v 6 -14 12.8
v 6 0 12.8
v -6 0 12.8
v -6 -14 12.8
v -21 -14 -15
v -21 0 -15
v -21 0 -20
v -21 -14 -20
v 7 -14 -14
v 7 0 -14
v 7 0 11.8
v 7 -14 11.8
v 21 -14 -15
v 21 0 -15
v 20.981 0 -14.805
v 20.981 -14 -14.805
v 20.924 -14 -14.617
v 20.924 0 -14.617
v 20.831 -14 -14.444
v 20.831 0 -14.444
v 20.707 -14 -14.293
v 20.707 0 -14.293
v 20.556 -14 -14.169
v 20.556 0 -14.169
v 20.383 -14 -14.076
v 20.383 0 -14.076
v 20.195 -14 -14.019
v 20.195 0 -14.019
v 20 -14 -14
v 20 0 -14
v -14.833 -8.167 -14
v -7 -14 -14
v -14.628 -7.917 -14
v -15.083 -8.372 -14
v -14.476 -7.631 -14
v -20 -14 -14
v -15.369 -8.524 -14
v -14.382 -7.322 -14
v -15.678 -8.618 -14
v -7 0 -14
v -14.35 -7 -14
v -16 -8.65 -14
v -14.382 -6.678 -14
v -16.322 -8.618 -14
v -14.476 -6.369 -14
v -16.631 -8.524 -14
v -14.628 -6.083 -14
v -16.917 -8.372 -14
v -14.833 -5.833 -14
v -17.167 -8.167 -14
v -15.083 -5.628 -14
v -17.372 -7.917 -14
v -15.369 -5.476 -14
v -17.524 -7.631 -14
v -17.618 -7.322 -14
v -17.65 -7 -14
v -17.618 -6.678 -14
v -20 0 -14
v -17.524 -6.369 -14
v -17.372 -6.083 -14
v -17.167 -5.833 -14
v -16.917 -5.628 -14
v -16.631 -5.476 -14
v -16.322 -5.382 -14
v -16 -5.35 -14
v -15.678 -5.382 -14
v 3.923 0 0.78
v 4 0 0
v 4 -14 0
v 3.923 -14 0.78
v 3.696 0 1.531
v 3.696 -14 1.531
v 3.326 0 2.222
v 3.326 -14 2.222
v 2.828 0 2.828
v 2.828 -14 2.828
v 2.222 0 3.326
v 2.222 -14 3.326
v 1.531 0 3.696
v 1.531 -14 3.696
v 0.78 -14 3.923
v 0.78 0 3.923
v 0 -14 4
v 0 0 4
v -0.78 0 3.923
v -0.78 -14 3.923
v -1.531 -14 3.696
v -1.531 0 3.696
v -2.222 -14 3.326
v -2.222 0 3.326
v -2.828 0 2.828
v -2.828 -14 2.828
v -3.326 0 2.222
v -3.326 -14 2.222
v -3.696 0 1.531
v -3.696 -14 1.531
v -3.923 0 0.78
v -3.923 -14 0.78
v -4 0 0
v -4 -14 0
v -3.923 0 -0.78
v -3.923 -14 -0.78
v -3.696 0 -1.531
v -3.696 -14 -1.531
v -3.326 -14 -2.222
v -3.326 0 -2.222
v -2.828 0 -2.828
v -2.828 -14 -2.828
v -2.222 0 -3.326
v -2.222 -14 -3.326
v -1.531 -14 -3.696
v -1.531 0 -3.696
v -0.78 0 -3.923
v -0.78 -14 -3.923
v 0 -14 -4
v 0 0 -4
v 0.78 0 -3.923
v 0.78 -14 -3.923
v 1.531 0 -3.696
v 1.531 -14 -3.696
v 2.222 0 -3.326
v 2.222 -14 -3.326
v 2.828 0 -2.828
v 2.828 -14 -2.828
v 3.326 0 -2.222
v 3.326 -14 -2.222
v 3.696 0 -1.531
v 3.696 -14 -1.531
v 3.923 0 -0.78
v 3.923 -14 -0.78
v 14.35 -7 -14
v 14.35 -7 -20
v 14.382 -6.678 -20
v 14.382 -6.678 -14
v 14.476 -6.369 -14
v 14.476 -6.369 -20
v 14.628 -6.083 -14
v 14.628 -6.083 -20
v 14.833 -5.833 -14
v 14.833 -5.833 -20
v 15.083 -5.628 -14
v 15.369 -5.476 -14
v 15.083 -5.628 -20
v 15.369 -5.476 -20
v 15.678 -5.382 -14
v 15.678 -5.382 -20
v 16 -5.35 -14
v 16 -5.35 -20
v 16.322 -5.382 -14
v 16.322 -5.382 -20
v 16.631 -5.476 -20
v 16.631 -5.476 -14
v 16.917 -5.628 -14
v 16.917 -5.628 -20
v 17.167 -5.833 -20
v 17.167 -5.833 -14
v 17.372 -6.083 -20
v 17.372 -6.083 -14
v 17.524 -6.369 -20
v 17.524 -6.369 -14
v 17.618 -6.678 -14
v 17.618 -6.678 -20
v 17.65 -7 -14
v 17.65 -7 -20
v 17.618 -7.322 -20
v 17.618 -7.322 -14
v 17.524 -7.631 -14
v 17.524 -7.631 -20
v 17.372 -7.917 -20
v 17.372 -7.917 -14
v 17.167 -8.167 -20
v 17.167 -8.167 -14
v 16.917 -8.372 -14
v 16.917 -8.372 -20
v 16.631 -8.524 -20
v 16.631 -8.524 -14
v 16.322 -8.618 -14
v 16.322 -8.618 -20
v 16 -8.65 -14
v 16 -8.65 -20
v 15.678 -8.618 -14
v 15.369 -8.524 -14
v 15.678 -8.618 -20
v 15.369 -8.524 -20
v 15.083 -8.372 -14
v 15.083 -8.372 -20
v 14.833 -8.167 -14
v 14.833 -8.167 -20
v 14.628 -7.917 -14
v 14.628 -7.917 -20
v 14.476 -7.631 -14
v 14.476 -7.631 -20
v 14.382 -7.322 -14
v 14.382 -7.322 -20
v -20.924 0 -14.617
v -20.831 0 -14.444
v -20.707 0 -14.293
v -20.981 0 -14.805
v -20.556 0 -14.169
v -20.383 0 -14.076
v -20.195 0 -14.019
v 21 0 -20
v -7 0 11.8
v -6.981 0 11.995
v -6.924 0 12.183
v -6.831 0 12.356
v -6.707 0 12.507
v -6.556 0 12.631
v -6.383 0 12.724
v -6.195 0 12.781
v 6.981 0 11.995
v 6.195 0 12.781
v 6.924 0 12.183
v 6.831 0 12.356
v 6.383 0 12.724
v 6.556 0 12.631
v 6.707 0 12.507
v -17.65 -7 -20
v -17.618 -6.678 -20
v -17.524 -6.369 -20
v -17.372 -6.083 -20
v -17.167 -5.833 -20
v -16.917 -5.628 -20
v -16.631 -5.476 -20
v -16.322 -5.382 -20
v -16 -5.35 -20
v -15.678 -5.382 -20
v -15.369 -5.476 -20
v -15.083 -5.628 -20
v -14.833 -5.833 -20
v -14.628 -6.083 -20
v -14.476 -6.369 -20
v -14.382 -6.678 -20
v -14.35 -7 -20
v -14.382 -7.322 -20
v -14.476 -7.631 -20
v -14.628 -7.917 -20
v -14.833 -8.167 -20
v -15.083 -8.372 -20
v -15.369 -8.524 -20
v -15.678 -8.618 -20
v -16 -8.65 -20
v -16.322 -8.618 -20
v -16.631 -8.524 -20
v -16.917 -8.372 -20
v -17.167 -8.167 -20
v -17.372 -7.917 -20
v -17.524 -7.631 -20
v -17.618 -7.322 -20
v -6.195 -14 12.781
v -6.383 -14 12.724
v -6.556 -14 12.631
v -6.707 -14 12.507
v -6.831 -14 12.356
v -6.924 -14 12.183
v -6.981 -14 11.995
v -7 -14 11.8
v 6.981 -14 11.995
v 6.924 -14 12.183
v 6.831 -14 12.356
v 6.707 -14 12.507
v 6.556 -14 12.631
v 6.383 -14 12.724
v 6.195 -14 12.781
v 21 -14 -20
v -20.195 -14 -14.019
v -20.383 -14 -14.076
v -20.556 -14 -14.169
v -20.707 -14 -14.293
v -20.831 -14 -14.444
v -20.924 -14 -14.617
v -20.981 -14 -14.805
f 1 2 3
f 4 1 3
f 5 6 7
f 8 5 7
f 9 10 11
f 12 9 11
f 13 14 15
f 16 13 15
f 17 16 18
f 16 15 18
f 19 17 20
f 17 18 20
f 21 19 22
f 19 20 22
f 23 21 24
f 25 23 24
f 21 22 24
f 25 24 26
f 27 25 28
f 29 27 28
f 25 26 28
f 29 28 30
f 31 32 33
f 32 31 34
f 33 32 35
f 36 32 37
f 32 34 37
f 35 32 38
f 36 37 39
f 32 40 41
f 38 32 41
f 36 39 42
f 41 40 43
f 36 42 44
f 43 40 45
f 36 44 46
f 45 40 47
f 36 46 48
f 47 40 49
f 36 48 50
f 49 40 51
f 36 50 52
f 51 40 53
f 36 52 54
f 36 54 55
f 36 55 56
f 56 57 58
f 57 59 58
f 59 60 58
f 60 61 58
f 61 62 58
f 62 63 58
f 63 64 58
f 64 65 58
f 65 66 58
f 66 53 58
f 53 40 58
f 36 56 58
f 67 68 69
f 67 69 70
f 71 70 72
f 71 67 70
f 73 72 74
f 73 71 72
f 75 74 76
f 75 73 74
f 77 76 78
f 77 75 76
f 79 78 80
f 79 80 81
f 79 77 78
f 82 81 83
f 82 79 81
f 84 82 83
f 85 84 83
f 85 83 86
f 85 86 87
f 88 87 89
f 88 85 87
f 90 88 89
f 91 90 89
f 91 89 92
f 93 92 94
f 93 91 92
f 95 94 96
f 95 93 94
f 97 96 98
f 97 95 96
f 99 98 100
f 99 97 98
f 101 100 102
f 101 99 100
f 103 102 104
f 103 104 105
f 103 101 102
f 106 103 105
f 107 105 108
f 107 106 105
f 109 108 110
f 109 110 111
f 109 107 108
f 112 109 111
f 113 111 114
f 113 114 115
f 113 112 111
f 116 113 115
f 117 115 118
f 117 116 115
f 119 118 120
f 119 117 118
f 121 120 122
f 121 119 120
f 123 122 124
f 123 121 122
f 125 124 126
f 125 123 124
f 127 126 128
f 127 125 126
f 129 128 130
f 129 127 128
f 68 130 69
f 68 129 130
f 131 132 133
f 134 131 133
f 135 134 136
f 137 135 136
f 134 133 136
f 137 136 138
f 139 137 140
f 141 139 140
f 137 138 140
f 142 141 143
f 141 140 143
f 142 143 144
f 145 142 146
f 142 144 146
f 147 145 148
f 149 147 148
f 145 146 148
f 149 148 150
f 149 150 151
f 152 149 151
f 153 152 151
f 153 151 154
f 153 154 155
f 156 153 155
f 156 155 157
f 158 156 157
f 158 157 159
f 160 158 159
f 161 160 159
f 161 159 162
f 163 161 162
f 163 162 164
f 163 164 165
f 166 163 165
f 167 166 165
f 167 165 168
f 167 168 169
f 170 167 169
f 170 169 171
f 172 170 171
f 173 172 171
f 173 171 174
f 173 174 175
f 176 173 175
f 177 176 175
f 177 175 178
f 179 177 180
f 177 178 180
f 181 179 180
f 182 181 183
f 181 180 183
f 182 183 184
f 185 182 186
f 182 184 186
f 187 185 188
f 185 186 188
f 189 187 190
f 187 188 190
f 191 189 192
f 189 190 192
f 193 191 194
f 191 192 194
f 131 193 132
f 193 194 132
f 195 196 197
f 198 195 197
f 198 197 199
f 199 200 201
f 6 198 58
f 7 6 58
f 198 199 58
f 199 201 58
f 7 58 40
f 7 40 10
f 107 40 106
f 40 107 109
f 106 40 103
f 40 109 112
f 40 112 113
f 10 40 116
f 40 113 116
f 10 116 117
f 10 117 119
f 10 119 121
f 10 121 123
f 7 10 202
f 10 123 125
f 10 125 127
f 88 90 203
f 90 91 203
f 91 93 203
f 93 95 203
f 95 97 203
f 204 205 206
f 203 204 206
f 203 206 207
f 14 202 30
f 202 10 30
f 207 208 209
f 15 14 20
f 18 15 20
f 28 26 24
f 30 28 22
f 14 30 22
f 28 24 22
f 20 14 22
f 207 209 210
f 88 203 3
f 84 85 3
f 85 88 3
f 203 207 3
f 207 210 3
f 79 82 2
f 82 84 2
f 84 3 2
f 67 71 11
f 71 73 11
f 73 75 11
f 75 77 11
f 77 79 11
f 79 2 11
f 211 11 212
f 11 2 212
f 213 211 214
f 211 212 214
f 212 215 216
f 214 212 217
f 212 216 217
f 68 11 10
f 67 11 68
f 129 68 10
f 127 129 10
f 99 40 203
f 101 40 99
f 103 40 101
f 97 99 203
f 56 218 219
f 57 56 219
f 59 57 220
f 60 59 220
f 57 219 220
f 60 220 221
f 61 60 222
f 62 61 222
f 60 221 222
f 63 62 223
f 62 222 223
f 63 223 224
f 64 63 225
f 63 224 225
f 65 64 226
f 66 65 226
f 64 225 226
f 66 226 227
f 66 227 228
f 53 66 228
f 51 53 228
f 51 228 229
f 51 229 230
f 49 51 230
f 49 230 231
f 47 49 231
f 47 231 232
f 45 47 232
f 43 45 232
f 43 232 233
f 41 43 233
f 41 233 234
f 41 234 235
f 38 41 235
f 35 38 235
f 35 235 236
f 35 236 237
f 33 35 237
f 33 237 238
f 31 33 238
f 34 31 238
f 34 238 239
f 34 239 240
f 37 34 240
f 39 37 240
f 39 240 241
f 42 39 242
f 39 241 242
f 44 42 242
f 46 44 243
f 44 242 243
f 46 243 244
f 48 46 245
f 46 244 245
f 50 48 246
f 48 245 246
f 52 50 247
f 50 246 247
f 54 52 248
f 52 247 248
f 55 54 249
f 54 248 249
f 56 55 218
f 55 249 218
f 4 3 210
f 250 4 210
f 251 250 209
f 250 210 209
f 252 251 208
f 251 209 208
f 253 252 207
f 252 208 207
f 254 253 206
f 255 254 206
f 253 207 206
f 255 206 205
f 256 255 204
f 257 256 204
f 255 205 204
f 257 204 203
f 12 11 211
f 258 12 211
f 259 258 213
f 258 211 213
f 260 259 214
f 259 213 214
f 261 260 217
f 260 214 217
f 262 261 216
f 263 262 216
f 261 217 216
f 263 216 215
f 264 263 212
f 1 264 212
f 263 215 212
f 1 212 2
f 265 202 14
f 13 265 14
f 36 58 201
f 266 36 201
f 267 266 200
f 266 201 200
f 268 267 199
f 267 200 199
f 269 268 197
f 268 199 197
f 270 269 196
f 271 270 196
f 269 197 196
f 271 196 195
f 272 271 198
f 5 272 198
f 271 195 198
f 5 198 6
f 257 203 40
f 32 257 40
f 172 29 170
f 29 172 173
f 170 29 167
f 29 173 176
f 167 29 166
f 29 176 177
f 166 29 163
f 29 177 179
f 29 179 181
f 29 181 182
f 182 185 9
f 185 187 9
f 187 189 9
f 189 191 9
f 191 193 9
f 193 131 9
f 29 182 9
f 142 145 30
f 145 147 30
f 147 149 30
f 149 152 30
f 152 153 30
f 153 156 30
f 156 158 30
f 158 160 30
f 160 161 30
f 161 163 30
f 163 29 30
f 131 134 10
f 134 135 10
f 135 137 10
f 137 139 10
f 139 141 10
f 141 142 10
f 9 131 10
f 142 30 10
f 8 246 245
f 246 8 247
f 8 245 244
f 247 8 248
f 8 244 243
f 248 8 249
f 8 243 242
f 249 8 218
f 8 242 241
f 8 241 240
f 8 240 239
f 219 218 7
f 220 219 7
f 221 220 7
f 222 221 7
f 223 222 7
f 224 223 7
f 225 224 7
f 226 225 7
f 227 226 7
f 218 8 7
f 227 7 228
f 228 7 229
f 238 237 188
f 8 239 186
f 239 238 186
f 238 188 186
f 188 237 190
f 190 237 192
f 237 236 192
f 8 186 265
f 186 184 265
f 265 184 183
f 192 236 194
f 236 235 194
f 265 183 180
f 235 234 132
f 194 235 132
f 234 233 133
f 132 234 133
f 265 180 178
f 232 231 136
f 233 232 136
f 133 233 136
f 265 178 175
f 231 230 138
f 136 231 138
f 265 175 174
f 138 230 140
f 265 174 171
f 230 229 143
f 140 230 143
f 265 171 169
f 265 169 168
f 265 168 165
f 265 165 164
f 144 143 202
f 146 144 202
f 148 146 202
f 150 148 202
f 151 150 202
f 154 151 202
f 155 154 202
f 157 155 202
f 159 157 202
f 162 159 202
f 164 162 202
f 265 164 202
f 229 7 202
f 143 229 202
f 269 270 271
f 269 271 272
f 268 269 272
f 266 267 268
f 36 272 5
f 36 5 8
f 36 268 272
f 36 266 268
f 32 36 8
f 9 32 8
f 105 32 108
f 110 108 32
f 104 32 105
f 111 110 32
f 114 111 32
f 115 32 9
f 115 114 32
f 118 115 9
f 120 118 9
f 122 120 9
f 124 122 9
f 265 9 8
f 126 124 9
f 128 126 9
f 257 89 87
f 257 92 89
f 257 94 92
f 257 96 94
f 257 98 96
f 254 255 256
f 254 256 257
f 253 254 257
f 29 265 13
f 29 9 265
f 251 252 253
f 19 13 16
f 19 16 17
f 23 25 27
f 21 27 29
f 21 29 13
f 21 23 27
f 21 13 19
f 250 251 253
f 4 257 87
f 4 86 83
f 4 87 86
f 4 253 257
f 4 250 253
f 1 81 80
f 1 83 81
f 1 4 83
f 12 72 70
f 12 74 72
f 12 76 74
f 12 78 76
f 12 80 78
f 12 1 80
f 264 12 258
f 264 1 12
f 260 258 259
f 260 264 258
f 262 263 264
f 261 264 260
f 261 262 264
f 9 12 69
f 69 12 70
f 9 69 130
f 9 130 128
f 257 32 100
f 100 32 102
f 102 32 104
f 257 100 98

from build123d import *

# Parameters (mm, degrees)
F0_R     = 4
F1_DEPTH = 14
F3_D     = 3.3


with BuildPart() as f1:
    # F0 (on Front) → F1 (new body)
    with BuildSketch(Plane.XZ):
        with BuildLine():
            Line((20, -14), (7, -14))
            Line((7, -14), (7, 11.8))
            ThreePointArc((7, 11.8), (6.707107, 12.507107), (6, 12.8))
            Line((6, 12.8), (-6, 12.8))
            ThreePointArc((-6, 12.8), (-6.707107, 12.507107), (-7, 11.8))
            Line((-7, 11.8), (-7, -14))
            Line((-7, -14), (-20, -14))
            ThreePointArc((-20, -14), (-20.707107, -14.292893), (-21, -15))
            Line((-21, -15), (-21, -20))
            Line((-21, -20), (21, -20))
            Line((21, -20), (21, -15))
            ThreePointArc((21, -15), (20.707107, -14.292893), (20, -14))
        make_face()
        Circle(F0_R, mode=Mode.SUBTRACT)
    extrude(amount=F1_DEPTH)

    # F3 (through all)
    with Locations(Plane.XY):
        with Locations((-16, -7), (16, -7)):
            Hole(F3_D / 2)


solid = f1.part
